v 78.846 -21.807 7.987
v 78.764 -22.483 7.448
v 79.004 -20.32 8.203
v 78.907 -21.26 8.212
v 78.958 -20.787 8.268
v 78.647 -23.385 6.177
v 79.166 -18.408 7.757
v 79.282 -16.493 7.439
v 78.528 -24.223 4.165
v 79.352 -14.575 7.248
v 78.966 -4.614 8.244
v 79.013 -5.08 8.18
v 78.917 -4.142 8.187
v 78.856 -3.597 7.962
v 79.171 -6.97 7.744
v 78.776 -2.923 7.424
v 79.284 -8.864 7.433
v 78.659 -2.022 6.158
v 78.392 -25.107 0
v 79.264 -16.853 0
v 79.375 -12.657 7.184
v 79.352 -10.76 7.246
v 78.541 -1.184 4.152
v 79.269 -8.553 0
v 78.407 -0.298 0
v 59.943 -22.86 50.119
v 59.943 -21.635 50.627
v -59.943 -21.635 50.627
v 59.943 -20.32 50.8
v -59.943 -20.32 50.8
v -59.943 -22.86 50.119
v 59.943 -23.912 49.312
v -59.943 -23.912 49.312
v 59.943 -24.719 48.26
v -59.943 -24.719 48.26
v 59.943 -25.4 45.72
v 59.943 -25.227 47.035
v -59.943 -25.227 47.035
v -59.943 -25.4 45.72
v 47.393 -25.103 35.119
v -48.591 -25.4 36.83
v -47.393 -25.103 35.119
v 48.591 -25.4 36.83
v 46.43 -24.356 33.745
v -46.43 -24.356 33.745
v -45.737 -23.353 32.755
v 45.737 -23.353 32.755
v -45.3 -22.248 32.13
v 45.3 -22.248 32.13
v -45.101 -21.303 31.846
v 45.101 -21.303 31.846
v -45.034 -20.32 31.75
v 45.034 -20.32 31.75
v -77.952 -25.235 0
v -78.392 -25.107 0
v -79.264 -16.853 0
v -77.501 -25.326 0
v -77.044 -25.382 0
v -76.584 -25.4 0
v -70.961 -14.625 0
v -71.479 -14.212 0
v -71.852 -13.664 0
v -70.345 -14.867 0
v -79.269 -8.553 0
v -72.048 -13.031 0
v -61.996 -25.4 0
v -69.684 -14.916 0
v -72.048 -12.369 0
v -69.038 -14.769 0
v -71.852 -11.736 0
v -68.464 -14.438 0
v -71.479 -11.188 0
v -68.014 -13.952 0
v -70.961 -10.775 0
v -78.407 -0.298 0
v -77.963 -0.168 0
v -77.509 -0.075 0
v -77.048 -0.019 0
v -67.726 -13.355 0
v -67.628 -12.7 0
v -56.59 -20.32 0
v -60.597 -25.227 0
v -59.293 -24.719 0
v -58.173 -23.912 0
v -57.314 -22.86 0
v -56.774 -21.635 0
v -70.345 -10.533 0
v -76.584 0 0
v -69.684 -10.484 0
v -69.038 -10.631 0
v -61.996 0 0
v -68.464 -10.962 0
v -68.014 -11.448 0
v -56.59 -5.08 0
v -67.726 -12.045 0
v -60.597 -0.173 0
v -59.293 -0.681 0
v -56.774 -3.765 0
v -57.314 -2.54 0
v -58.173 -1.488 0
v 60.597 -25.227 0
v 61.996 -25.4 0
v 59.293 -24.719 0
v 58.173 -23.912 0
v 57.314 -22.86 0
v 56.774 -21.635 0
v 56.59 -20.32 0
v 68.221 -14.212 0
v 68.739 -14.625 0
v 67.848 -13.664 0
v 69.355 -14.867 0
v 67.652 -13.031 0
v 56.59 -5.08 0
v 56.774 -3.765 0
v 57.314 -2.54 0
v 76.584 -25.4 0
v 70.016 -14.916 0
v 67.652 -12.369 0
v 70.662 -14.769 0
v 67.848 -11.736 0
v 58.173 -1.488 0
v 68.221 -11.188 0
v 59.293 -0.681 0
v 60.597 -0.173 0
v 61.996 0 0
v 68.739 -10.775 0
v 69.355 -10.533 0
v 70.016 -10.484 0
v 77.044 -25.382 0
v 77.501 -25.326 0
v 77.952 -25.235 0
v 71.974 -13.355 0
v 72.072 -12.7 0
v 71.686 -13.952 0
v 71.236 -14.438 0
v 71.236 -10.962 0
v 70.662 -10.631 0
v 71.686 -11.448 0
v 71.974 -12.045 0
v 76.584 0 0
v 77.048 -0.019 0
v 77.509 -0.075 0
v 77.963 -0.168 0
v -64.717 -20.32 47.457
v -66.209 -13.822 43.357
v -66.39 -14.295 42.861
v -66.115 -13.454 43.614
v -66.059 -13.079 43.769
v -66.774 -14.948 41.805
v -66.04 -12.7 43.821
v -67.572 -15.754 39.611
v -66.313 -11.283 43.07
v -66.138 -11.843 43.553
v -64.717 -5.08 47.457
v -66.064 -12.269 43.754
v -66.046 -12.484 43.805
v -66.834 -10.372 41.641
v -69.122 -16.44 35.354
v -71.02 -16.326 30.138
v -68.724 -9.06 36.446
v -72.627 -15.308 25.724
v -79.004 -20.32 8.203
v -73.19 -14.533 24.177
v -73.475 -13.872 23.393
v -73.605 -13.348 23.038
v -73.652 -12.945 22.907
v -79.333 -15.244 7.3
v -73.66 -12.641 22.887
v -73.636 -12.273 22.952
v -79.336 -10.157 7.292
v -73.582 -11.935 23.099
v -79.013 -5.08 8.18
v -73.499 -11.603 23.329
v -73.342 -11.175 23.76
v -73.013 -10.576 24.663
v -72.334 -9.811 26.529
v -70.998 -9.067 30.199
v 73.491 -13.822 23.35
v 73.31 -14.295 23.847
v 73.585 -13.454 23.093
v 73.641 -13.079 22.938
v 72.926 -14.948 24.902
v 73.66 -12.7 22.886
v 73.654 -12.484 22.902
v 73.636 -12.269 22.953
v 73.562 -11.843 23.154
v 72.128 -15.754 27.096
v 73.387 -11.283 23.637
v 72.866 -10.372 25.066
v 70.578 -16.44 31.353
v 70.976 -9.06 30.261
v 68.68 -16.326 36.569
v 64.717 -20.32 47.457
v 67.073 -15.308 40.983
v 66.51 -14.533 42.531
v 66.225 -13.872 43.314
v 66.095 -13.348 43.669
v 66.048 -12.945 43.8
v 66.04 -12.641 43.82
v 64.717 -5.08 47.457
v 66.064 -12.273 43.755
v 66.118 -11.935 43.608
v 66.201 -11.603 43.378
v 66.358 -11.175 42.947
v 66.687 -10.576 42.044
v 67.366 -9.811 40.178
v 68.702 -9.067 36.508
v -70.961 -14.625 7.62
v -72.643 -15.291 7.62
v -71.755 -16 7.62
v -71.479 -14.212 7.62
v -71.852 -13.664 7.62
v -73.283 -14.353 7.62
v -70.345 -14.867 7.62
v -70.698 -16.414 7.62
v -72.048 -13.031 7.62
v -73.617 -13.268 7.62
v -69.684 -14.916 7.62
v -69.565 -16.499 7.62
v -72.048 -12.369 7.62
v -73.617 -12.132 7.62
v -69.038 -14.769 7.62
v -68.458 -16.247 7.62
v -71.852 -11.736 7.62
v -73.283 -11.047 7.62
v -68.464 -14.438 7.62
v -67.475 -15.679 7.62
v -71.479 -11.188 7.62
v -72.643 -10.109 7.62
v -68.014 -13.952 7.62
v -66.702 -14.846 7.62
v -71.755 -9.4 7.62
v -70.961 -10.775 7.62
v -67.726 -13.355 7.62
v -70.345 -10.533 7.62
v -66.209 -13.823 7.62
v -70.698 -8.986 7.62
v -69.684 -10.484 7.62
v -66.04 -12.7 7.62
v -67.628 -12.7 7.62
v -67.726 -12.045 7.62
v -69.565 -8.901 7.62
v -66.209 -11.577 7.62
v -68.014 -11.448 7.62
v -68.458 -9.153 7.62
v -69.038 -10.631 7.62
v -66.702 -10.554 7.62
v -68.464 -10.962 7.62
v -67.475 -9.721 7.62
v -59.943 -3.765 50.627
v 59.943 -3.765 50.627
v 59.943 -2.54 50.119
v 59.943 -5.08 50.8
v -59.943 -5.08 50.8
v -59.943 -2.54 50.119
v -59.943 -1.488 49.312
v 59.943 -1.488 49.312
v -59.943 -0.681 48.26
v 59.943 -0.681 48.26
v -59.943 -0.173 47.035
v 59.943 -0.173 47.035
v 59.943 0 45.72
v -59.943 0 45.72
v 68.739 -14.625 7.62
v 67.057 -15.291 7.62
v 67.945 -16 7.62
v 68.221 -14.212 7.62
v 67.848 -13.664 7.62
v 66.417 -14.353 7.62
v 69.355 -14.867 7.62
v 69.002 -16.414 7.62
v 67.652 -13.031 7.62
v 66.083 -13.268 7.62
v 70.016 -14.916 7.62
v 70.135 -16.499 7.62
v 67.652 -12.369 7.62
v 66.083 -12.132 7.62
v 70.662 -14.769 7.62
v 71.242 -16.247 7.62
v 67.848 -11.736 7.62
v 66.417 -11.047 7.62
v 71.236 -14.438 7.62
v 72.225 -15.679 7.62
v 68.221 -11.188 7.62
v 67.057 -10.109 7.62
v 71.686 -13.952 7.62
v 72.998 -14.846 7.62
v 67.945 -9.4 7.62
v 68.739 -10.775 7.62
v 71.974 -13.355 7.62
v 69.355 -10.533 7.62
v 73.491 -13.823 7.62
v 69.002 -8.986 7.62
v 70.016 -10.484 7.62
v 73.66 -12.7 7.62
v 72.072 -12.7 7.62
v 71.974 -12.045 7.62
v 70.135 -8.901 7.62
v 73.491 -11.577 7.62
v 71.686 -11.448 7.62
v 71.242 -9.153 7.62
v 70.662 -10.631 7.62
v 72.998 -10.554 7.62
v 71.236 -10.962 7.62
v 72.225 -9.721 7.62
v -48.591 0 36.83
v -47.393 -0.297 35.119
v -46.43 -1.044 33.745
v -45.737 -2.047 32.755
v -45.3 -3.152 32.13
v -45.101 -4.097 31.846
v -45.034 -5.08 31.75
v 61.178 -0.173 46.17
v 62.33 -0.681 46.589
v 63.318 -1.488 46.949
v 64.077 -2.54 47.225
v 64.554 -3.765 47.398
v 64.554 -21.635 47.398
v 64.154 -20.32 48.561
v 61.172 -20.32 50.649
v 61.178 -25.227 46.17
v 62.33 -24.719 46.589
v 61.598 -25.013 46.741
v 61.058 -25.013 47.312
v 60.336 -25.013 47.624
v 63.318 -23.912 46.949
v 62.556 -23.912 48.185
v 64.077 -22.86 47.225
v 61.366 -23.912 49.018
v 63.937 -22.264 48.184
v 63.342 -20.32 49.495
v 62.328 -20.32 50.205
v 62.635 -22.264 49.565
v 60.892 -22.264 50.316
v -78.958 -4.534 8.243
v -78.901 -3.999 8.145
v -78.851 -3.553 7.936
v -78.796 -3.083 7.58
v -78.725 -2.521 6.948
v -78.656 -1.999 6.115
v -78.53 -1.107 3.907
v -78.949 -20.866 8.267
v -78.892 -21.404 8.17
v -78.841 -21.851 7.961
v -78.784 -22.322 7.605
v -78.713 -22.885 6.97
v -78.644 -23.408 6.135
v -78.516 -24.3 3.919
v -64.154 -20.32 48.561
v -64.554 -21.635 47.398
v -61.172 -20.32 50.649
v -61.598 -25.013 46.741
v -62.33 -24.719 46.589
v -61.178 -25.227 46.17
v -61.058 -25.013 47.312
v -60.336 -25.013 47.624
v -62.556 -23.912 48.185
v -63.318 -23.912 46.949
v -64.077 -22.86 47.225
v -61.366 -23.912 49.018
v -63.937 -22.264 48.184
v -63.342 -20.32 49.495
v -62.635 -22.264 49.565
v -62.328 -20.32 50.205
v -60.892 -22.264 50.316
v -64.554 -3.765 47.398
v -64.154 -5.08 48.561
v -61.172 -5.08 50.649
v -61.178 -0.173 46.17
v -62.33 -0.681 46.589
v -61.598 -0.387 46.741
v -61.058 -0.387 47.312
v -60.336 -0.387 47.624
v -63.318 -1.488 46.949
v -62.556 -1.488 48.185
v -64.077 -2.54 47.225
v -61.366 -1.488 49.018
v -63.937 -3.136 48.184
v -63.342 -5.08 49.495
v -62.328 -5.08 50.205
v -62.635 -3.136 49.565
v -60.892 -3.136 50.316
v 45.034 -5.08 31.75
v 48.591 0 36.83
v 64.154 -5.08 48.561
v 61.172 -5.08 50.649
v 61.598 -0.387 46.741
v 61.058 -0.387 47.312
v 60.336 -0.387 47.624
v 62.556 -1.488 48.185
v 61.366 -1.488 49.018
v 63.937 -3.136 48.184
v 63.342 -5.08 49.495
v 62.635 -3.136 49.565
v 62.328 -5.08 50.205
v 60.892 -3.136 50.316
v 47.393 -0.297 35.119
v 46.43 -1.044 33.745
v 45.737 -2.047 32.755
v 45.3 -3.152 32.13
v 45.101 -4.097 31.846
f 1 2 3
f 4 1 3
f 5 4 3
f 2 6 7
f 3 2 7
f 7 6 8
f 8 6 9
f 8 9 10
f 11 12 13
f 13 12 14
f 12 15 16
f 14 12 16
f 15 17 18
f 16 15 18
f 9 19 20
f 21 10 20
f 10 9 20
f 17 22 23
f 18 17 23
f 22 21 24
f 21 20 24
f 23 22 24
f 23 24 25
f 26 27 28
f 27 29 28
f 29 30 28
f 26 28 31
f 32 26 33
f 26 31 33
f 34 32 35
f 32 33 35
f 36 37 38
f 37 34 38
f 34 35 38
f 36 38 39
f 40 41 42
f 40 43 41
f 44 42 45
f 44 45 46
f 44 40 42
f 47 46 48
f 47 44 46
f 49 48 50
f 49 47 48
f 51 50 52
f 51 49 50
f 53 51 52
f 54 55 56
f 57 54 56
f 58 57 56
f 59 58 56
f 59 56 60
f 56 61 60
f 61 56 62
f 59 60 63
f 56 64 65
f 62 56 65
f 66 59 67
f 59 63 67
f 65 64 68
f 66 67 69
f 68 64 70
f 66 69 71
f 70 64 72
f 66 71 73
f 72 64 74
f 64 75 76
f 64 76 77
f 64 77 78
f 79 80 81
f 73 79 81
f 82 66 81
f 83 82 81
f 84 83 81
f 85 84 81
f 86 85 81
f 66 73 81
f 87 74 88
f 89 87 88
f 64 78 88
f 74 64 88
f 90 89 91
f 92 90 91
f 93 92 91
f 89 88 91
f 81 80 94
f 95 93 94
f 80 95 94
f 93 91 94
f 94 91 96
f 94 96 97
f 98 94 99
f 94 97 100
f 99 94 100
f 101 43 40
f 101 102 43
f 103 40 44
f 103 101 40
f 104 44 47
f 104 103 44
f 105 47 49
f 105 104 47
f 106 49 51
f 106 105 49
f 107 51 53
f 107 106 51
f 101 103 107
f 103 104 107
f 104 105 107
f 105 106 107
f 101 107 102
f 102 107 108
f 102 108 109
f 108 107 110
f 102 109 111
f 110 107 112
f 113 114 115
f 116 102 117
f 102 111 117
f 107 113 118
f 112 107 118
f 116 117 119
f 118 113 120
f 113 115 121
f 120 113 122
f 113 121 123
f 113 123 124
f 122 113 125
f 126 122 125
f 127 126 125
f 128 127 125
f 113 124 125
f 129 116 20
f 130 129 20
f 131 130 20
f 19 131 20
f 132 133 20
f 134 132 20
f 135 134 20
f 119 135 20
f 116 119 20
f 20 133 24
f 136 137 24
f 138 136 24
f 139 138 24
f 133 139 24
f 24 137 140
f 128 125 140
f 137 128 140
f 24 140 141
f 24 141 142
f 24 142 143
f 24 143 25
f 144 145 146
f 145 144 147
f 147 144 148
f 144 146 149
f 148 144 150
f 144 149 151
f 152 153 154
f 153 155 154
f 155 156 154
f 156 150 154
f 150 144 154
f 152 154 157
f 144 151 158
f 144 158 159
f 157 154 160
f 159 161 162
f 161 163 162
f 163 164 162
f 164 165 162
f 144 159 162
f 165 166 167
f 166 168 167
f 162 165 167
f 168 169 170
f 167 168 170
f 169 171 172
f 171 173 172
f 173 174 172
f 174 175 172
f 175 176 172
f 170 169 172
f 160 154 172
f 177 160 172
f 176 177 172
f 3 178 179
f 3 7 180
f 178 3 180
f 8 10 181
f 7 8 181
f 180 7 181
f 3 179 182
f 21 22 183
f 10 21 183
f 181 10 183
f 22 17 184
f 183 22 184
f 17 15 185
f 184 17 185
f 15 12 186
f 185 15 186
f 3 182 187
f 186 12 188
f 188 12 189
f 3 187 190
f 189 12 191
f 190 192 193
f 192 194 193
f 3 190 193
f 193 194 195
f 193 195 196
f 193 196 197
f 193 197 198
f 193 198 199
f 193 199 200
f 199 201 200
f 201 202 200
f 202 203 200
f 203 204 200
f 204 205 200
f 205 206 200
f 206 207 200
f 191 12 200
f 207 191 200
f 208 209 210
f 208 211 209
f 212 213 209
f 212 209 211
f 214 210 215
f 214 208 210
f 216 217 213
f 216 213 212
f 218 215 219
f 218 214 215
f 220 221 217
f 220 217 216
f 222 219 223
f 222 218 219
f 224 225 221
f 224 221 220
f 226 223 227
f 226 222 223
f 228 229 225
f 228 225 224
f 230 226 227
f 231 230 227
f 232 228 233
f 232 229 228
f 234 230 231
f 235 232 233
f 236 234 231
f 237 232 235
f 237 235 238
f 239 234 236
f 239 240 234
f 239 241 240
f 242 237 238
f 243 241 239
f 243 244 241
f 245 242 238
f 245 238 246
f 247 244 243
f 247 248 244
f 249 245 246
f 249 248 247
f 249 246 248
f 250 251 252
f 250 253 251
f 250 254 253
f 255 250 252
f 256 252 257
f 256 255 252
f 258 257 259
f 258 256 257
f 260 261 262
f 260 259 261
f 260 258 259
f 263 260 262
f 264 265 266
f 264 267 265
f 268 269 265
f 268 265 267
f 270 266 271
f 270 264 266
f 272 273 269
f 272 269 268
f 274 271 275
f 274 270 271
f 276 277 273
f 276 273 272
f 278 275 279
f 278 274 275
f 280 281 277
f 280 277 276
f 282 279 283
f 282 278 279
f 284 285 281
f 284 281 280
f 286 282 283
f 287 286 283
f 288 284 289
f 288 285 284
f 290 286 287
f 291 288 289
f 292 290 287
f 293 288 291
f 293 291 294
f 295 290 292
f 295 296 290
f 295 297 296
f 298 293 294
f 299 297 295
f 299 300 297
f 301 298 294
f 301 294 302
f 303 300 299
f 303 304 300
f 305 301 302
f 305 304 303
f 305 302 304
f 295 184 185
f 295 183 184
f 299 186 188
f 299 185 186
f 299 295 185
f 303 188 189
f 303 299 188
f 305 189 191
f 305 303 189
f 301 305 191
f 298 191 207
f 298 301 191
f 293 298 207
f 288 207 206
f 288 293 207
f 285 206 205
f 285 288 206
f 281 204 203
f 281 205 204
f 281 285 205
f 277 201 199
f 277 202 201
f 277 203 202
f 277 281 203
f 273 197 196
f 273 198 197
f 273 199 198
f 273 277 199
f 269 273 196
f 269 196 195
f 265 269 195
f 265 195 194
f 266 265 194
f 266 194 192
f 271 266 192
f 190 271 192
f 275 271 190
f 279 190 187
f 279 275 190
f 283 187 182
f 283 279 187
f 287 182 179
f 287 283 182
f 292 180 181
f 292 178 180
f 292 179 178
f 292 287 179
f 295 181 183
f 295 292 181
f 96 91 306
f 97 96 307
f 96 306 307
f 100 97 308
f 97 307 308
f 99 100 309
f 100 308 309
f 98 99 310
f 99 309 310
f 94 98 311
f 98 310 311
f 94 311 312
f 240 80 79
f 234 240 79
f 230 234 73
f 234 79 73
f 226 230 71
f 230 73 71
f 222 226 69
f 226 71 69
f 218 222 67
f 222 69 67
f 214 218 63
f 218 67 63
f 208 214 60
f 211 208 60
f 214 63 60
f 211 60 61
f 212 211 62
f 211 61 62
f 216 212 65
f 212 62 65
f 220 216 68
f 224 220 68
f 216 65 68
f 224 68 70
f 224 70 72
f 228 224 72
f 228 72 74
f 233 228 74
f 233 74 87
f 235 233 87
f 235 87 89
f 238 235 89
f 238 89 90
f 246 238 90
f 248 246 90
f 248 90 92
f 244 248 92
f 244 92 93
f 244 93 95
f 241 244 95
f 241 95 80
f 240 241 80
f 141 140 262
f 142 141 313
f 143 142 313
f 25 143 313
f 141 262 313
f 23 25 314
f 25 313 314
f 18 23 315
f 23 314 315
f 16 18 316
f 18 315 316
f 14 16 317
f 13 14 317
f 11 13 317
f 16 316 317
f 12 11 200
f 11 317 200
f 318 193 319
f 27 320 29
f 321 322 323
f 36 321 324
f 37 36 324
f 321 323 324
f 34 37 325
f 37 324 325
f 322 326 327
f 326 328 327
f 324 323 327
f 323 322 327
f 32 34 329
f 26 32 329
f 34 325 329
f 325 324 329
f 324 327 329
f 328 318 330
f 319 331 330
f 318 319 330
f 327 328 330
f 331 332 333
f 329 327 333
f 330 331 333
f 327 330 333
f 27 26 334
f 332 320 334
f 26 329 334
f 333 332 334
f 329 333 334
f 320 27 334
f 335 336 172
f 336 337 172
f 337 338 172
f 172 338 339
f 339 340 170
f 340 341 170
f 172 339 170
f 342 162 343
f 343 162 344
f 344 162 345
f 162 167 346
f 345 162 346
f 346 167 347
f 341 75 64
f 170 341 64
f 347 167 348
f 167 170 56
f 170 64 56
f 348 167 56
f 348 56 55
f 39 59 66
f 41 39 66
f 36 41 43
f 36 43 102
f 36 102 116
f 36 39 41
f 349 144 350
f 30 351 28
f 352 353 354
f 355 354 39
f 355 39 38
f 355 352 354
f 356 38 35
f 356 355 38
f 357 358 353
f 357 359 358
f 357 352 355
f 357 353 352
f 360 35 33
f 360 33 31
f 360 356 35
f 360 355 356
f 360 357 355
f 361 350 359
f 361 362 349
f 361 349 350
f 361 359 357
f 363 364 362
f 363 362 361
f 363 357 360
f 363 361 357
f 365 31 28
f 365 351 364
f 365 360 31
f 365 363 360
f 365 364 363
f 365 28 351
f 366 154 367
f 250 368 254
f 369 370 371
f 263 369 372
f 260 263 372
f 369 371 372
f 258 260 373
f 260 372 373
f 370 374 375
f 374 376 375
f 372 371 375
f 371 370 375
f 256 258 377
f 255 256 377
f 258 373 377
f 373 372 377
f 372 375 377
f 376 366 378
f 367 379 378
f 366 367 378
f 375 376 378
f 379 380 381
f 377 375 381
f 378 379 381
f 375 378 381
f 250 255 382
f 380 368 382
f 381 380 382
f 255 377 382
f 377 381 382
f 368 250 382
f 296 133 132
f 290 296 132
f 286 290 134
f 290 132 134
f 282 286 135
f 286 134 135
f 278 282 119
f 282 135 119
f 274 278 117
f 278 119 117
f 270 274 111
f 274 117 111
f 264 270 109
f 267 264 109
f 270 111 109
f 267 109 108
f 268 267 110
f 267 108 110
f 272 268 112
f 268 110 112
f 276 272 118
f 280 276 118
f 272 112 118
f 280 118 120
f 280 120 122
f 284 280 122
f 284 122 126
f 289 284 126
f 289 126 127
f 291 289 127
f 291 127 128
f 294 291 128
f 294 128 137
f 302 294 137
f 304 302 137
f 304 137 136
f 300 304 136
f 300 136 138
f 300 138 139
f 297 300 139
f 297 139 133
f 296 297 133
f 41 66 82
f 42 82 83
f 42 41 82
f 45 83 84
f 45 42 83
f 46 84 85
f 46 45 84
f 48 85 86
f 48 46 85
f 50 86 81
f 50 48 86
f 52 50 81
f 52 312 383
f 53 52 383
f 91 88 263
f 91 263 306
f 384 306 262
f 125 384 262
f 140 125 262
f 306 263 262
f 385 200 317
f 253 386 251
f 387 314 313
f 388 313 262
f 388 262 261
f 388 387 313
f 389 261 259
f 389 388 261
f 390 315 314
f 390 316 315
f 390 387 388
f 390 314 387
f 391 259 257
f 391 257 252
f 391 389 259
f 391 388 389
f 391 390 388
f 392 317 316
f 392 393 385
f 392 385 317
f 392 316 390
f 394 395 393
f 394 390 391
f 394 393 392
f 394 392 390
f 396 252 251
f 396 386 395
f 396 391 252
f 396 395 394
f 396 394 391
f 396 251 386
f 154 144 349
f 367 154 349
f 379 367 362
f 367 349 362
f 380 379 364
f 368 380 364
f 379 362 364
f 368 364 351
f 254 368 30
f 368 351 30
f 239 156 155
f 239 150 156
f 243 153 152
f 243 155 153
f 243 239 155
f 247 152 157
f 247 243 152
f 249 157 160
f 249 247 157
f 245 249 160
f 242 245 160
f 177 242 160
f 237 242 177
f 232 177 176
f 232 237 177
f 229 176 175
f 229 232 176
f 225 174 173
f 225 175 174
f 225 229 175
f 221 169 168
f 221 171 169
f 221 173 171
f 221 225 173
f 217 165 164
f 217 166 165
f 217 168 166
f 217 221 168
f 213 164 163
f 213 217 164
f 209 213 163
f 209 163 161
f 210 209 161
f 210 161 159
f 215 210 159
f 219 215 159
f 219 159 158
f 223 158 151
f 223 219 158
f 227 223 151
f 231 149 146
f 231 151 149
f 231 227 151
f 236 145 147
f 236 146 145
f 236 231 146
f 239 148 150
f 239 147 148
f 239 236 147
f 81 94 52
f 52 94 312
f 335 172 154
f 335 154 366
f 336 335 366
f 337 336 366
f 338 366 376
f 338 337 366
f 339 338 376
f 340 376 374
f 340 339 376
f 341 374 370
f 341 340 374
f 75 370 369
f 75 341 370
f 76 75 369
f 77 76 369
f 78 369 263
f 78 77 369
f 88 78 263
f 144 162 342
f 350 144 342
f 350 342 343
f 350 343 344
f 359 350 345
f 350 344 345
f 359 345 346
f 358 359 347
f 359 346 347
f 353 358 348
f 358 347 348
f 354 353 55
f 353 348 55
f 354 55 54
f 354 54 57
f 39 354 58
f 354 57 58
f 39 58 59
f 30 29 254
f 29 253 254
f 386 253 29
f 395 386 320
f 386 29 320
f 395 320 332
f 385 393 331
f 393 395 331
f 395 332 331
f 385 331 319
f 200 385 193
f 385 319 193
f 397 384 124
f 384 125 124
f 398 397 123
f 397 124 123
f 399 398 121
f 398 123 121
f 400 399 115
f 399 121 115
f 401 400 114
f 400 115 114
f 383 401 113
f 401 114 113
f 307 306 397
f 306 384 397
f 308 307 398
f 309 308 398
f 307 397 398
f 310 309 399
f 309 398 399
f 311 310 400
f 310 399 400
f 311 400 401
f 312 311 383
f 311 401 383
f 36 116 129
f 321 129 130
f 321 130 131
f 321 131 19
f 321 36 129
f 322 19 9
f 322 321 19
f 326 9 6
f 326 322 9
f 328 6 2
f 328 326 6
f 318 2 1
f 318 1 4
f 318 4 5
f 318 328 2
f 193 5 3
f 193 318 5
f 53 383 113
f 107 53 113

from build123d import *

# Parameters (mm, degrees)
F1_DEPTH = 25.4
F2_R     = 2.2225
F3_DEPTH = 33.353518
F4_R     = 5.08
F6_R     = 3.81
F7_DEPTH = 43.18
F8_R     = 88.709103
F8_R_2   = 79.375
F9_DEPTH = 25.4


with BuildPart() as f1:
    # F0 (on Front) → F1 (new body)
    with BuildSketch(Plane.XZ):
        Polygon((-63.5, 50.8), (-81.989688, 0), (-56.589688, 0), (-45.033633, 31.75), (45.033633, 31.75), (56.589688, 0), (81.989688, 0), (63.5, 50.8), align=None)
    extrude(amount=F1_DEPTH)

    # F2 (on face) → F3 (cut, through all)
    with BuildSketch(Plane(origin=(0, 0, 0), x_dir=(1, 0, 0), z_dir=(0, 0, -1))):
        with Locations((69.85, 12.7)):
            Circle(F2_R)
        with Locations((-69.85, 12.7)):
            Circle(F2_R)
    extrude(amount=-F3_DEPTH, mode=Mode.SUBTRACT)

    # F4
    f4_edges = [f1.edges().sort_by_distance(p)[0] for p in [
        (-72.744844, -25.4, 25.4),
        (-50.81166, -25.4, 15.875),
        (0, -25.4, 31.75),
        (50.81166, -25.4, 15.875),
        (72.744844, -25.4, 25.4),
        (0, -25.4, 50.8),
        (72.744844, 0, 25.4),
        (50.81166, 0, 15.875),
        (0, 0, 31.75),
        (-50.81166, 0, 15.875),
        (-72.744844, 0, 25.4),
        (0, 0, 50.8),
        (-63.5, -12.7, 50.8),
        (63.5, -12.7, 50.8),
    ]]
    fillet(f4_edges, radius=F4_R)

    # F6 (on offset) → F7 (cut, through all)
    with BuildSketch(Plane.XY.offset(7.62)):
        with Locations((-69.85, -12.7)):
            Circle(F6_R)
        with Locations((69.85, -12.7)):
            Circle(F6_R)
    extrude(amount=F7_DEPTH, mode=Mode.SUBTRACT)

    # F8 (on Top) → F9 (cut)
    with BuildSketch(Plane.XY):
        with Locations((0, -12.65686)):
            Circle(F8_R)
        with Locations((0, -12.65686)):
            Circle(F8_R_2, mode=Mode.SUBTRACT)
    extrude(amount=F9_DEPTH, mode=Mode.SUBTRACT)


solid = f1.part
